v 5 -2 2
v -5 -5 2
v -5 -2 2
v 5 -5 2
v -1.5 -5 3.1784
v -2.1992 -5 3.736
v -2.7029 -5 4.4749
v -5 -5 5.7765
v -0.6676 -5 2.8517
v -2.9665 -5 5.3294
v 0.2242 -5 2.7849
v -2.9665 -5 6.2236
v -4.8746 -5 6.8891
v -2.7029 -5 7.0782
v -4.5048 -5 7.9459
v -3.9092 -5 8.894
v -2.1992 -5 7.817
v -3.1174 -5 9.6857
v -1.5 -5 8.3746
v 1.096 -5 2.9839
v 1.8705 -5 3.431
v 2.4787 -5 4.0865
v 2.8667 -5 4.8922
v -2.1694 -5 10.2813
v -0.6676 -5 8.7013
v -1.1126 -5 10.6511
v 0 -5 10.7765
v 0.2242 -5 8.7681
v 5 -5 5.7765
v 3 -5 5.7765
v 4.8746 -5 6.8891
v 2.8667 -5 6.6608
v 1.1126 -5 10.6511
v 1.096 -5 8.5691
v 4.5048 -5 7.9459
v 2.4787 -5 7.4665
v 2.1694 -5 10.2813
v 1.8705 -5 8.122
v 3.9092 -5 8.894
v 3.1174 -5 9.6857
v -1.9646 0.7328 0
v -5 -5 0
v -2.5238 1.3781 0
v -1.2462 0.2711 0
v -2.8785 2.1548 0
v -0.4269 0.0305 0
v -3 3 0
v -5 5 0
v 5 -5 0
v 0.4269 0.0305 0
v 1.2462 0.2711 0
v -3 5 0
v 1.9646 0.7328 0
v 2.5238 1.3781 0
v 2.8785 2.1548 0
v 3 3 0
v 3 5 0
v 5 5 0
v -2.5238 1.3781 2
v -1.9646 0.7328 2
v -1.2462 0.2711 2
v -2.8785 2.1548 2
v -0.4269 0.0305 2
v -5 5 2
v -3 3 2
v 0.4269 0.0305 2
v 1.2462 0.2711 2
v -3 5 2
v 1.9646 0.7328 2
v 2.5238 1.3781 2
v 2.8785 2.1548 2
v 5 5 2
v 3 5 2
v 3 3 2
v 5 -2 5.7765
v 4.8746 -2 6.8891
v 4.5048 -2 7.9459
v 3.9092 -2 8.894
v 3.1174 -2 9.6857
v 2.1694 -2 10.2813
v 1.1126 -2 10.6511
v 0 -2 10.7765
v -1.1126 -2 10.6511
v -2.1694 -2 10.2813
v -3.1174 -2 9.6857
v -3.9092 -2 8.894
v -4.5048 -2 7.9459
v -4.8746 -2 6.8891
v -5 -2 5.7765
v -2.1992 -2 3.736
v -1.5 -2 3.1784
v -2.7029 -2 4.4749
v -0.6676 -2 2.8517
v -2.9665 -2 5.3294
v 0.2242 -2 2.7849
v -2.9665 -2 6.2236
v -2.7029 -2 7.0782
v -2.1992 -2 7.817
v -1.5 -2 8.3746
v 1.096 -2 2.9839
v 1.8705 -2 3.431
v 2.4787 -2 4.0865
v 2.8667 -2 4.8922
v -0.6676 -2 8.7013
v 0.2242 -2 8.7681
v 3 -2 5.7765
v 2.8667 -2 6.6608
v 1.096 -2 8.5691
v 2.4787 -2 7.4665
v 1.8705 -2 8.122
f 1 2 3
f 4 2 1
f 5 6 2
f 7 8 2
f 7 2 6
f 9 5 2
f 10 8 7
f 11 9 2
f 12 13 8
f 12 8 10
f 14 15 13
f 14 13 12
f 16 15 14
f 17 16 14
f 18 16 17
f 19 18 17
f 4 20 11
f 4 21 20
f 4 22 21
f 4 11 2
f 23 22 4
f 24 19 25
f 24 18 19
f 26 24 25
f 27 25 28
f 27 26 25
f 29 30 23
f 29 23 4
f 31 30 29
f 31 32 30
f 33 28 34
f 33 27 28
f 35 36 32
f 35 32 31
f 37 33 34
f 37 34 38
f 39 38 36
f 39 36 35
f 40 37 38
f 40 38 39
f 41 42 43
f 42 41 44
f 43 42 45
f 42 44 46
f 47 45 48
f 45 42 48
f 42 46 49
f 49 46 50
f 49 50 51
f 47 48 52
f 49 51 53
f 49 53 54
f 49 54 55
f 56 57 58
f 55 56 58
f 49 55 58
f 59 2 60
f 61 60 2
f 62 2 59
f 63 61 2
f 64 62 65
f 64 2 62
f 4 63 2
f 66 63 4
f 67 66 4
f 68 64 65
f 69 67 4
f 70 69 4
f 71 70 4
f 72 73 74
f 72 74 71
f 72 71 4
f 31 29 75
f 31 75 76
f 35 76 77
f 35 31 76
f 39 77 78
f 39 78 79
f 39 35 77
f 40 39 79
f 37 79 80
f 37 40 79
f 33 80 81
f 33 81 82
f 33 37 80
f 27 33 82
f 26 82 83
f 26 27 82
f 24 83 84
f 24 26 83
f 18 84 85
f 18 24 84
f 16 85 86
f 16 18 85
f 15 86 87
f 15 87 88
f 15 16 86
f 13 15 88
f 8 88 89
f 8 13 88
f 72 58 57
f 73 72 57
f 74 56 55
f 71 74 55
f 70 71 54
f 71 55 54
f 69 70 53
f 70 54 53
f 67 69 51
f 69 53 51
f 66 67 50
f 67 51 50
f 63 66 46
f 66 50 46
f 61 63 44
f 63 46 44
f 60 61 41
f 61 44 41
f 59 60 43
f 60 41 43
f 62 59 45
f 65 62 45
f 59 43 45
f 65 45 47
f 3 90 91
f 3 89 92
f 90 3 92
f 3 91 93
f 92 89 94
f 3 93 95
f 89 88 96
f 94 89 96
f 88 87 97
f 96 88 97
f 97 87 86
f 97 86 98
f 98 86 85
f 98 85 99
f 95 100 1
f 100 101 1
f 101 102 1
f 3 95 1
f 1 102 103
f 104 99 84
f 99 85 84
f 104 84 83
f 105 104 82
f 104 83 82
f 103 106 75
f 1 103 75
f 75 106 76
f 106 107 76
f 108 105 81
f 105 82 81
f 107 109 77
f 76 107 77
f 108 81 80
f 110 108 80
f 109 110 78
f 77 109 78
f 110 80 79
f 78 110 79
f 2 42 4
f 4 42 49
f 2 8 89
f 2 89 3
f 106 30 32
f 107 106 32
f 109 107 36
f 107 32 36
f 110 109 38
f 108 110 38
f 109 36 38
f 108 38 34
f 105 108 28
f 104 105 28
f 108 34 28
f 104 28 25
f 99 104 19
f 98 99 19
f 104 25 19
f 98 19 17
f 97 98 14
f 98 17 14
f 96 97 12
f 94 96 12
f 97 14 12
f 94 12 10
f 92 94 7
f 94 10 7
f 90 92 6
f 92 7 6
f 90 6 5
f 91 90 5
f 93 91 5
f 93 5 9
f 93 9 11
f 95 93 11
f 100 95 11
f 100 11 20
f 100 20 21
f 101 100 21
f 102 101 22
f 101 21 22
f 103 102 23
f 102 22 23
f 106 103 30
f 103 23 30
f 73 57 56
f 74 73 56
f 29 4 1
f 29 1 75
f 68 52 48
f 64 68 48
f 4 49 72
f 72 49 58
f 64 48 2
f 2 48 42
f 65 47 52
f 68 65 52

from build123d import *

# Parameters (mm, degrees)
BOSS_EXTRUDE1_DEPTH = 2
SKETCH2_R           = 3
BOSS_EXTRUDE2_DEPTH = 3


with BuildPart() as part:
    # Sketch1 → Boss-Extrude1 (new body)
    with BuildSketch(Plane.XY):
        with BuildLine():
            Line((-5, -5), (5, -5))
            Line((5, -5), (5, 5))
            Line((5, 5), (3, 5))
            Line((3, 5), (3, 3))
            ThreePointArc((3, 3), (0, 0), (-3, 3))
            Line((-3, 3), (-3, 5))
            Line((-3, 5), (-5, 5))
            Line((-5, 5), (-5, -5))
        make_face()
    extrude(amount=BOSS_EXTRUDE1_DEPTH)


with BuildPart() as body_2:
    # Sketch2 → Boss-Extrude2 (new body)
    with BuildSketch(Plane.XZ.offset(5)):
        with BuildLine():
            Line((-5, 2), (5, 2))
            Line((5, 2), (5, 5.776505143))
            ThreePointArc((5, 5.776505143), (0, 10.776505143), (-5, 5.776505143))
            Line((-5, 5.776505143), (-5, 2))
        make_face()
        with Locations((0, 5.776505143)):
            Circle(SKETCH2_R, mode=Mode.SUBTRACT)
    extrude(amount=-BOSS_EXTRUDE2_DEPTH)


solid = Compound([part.part, body_2.part])
